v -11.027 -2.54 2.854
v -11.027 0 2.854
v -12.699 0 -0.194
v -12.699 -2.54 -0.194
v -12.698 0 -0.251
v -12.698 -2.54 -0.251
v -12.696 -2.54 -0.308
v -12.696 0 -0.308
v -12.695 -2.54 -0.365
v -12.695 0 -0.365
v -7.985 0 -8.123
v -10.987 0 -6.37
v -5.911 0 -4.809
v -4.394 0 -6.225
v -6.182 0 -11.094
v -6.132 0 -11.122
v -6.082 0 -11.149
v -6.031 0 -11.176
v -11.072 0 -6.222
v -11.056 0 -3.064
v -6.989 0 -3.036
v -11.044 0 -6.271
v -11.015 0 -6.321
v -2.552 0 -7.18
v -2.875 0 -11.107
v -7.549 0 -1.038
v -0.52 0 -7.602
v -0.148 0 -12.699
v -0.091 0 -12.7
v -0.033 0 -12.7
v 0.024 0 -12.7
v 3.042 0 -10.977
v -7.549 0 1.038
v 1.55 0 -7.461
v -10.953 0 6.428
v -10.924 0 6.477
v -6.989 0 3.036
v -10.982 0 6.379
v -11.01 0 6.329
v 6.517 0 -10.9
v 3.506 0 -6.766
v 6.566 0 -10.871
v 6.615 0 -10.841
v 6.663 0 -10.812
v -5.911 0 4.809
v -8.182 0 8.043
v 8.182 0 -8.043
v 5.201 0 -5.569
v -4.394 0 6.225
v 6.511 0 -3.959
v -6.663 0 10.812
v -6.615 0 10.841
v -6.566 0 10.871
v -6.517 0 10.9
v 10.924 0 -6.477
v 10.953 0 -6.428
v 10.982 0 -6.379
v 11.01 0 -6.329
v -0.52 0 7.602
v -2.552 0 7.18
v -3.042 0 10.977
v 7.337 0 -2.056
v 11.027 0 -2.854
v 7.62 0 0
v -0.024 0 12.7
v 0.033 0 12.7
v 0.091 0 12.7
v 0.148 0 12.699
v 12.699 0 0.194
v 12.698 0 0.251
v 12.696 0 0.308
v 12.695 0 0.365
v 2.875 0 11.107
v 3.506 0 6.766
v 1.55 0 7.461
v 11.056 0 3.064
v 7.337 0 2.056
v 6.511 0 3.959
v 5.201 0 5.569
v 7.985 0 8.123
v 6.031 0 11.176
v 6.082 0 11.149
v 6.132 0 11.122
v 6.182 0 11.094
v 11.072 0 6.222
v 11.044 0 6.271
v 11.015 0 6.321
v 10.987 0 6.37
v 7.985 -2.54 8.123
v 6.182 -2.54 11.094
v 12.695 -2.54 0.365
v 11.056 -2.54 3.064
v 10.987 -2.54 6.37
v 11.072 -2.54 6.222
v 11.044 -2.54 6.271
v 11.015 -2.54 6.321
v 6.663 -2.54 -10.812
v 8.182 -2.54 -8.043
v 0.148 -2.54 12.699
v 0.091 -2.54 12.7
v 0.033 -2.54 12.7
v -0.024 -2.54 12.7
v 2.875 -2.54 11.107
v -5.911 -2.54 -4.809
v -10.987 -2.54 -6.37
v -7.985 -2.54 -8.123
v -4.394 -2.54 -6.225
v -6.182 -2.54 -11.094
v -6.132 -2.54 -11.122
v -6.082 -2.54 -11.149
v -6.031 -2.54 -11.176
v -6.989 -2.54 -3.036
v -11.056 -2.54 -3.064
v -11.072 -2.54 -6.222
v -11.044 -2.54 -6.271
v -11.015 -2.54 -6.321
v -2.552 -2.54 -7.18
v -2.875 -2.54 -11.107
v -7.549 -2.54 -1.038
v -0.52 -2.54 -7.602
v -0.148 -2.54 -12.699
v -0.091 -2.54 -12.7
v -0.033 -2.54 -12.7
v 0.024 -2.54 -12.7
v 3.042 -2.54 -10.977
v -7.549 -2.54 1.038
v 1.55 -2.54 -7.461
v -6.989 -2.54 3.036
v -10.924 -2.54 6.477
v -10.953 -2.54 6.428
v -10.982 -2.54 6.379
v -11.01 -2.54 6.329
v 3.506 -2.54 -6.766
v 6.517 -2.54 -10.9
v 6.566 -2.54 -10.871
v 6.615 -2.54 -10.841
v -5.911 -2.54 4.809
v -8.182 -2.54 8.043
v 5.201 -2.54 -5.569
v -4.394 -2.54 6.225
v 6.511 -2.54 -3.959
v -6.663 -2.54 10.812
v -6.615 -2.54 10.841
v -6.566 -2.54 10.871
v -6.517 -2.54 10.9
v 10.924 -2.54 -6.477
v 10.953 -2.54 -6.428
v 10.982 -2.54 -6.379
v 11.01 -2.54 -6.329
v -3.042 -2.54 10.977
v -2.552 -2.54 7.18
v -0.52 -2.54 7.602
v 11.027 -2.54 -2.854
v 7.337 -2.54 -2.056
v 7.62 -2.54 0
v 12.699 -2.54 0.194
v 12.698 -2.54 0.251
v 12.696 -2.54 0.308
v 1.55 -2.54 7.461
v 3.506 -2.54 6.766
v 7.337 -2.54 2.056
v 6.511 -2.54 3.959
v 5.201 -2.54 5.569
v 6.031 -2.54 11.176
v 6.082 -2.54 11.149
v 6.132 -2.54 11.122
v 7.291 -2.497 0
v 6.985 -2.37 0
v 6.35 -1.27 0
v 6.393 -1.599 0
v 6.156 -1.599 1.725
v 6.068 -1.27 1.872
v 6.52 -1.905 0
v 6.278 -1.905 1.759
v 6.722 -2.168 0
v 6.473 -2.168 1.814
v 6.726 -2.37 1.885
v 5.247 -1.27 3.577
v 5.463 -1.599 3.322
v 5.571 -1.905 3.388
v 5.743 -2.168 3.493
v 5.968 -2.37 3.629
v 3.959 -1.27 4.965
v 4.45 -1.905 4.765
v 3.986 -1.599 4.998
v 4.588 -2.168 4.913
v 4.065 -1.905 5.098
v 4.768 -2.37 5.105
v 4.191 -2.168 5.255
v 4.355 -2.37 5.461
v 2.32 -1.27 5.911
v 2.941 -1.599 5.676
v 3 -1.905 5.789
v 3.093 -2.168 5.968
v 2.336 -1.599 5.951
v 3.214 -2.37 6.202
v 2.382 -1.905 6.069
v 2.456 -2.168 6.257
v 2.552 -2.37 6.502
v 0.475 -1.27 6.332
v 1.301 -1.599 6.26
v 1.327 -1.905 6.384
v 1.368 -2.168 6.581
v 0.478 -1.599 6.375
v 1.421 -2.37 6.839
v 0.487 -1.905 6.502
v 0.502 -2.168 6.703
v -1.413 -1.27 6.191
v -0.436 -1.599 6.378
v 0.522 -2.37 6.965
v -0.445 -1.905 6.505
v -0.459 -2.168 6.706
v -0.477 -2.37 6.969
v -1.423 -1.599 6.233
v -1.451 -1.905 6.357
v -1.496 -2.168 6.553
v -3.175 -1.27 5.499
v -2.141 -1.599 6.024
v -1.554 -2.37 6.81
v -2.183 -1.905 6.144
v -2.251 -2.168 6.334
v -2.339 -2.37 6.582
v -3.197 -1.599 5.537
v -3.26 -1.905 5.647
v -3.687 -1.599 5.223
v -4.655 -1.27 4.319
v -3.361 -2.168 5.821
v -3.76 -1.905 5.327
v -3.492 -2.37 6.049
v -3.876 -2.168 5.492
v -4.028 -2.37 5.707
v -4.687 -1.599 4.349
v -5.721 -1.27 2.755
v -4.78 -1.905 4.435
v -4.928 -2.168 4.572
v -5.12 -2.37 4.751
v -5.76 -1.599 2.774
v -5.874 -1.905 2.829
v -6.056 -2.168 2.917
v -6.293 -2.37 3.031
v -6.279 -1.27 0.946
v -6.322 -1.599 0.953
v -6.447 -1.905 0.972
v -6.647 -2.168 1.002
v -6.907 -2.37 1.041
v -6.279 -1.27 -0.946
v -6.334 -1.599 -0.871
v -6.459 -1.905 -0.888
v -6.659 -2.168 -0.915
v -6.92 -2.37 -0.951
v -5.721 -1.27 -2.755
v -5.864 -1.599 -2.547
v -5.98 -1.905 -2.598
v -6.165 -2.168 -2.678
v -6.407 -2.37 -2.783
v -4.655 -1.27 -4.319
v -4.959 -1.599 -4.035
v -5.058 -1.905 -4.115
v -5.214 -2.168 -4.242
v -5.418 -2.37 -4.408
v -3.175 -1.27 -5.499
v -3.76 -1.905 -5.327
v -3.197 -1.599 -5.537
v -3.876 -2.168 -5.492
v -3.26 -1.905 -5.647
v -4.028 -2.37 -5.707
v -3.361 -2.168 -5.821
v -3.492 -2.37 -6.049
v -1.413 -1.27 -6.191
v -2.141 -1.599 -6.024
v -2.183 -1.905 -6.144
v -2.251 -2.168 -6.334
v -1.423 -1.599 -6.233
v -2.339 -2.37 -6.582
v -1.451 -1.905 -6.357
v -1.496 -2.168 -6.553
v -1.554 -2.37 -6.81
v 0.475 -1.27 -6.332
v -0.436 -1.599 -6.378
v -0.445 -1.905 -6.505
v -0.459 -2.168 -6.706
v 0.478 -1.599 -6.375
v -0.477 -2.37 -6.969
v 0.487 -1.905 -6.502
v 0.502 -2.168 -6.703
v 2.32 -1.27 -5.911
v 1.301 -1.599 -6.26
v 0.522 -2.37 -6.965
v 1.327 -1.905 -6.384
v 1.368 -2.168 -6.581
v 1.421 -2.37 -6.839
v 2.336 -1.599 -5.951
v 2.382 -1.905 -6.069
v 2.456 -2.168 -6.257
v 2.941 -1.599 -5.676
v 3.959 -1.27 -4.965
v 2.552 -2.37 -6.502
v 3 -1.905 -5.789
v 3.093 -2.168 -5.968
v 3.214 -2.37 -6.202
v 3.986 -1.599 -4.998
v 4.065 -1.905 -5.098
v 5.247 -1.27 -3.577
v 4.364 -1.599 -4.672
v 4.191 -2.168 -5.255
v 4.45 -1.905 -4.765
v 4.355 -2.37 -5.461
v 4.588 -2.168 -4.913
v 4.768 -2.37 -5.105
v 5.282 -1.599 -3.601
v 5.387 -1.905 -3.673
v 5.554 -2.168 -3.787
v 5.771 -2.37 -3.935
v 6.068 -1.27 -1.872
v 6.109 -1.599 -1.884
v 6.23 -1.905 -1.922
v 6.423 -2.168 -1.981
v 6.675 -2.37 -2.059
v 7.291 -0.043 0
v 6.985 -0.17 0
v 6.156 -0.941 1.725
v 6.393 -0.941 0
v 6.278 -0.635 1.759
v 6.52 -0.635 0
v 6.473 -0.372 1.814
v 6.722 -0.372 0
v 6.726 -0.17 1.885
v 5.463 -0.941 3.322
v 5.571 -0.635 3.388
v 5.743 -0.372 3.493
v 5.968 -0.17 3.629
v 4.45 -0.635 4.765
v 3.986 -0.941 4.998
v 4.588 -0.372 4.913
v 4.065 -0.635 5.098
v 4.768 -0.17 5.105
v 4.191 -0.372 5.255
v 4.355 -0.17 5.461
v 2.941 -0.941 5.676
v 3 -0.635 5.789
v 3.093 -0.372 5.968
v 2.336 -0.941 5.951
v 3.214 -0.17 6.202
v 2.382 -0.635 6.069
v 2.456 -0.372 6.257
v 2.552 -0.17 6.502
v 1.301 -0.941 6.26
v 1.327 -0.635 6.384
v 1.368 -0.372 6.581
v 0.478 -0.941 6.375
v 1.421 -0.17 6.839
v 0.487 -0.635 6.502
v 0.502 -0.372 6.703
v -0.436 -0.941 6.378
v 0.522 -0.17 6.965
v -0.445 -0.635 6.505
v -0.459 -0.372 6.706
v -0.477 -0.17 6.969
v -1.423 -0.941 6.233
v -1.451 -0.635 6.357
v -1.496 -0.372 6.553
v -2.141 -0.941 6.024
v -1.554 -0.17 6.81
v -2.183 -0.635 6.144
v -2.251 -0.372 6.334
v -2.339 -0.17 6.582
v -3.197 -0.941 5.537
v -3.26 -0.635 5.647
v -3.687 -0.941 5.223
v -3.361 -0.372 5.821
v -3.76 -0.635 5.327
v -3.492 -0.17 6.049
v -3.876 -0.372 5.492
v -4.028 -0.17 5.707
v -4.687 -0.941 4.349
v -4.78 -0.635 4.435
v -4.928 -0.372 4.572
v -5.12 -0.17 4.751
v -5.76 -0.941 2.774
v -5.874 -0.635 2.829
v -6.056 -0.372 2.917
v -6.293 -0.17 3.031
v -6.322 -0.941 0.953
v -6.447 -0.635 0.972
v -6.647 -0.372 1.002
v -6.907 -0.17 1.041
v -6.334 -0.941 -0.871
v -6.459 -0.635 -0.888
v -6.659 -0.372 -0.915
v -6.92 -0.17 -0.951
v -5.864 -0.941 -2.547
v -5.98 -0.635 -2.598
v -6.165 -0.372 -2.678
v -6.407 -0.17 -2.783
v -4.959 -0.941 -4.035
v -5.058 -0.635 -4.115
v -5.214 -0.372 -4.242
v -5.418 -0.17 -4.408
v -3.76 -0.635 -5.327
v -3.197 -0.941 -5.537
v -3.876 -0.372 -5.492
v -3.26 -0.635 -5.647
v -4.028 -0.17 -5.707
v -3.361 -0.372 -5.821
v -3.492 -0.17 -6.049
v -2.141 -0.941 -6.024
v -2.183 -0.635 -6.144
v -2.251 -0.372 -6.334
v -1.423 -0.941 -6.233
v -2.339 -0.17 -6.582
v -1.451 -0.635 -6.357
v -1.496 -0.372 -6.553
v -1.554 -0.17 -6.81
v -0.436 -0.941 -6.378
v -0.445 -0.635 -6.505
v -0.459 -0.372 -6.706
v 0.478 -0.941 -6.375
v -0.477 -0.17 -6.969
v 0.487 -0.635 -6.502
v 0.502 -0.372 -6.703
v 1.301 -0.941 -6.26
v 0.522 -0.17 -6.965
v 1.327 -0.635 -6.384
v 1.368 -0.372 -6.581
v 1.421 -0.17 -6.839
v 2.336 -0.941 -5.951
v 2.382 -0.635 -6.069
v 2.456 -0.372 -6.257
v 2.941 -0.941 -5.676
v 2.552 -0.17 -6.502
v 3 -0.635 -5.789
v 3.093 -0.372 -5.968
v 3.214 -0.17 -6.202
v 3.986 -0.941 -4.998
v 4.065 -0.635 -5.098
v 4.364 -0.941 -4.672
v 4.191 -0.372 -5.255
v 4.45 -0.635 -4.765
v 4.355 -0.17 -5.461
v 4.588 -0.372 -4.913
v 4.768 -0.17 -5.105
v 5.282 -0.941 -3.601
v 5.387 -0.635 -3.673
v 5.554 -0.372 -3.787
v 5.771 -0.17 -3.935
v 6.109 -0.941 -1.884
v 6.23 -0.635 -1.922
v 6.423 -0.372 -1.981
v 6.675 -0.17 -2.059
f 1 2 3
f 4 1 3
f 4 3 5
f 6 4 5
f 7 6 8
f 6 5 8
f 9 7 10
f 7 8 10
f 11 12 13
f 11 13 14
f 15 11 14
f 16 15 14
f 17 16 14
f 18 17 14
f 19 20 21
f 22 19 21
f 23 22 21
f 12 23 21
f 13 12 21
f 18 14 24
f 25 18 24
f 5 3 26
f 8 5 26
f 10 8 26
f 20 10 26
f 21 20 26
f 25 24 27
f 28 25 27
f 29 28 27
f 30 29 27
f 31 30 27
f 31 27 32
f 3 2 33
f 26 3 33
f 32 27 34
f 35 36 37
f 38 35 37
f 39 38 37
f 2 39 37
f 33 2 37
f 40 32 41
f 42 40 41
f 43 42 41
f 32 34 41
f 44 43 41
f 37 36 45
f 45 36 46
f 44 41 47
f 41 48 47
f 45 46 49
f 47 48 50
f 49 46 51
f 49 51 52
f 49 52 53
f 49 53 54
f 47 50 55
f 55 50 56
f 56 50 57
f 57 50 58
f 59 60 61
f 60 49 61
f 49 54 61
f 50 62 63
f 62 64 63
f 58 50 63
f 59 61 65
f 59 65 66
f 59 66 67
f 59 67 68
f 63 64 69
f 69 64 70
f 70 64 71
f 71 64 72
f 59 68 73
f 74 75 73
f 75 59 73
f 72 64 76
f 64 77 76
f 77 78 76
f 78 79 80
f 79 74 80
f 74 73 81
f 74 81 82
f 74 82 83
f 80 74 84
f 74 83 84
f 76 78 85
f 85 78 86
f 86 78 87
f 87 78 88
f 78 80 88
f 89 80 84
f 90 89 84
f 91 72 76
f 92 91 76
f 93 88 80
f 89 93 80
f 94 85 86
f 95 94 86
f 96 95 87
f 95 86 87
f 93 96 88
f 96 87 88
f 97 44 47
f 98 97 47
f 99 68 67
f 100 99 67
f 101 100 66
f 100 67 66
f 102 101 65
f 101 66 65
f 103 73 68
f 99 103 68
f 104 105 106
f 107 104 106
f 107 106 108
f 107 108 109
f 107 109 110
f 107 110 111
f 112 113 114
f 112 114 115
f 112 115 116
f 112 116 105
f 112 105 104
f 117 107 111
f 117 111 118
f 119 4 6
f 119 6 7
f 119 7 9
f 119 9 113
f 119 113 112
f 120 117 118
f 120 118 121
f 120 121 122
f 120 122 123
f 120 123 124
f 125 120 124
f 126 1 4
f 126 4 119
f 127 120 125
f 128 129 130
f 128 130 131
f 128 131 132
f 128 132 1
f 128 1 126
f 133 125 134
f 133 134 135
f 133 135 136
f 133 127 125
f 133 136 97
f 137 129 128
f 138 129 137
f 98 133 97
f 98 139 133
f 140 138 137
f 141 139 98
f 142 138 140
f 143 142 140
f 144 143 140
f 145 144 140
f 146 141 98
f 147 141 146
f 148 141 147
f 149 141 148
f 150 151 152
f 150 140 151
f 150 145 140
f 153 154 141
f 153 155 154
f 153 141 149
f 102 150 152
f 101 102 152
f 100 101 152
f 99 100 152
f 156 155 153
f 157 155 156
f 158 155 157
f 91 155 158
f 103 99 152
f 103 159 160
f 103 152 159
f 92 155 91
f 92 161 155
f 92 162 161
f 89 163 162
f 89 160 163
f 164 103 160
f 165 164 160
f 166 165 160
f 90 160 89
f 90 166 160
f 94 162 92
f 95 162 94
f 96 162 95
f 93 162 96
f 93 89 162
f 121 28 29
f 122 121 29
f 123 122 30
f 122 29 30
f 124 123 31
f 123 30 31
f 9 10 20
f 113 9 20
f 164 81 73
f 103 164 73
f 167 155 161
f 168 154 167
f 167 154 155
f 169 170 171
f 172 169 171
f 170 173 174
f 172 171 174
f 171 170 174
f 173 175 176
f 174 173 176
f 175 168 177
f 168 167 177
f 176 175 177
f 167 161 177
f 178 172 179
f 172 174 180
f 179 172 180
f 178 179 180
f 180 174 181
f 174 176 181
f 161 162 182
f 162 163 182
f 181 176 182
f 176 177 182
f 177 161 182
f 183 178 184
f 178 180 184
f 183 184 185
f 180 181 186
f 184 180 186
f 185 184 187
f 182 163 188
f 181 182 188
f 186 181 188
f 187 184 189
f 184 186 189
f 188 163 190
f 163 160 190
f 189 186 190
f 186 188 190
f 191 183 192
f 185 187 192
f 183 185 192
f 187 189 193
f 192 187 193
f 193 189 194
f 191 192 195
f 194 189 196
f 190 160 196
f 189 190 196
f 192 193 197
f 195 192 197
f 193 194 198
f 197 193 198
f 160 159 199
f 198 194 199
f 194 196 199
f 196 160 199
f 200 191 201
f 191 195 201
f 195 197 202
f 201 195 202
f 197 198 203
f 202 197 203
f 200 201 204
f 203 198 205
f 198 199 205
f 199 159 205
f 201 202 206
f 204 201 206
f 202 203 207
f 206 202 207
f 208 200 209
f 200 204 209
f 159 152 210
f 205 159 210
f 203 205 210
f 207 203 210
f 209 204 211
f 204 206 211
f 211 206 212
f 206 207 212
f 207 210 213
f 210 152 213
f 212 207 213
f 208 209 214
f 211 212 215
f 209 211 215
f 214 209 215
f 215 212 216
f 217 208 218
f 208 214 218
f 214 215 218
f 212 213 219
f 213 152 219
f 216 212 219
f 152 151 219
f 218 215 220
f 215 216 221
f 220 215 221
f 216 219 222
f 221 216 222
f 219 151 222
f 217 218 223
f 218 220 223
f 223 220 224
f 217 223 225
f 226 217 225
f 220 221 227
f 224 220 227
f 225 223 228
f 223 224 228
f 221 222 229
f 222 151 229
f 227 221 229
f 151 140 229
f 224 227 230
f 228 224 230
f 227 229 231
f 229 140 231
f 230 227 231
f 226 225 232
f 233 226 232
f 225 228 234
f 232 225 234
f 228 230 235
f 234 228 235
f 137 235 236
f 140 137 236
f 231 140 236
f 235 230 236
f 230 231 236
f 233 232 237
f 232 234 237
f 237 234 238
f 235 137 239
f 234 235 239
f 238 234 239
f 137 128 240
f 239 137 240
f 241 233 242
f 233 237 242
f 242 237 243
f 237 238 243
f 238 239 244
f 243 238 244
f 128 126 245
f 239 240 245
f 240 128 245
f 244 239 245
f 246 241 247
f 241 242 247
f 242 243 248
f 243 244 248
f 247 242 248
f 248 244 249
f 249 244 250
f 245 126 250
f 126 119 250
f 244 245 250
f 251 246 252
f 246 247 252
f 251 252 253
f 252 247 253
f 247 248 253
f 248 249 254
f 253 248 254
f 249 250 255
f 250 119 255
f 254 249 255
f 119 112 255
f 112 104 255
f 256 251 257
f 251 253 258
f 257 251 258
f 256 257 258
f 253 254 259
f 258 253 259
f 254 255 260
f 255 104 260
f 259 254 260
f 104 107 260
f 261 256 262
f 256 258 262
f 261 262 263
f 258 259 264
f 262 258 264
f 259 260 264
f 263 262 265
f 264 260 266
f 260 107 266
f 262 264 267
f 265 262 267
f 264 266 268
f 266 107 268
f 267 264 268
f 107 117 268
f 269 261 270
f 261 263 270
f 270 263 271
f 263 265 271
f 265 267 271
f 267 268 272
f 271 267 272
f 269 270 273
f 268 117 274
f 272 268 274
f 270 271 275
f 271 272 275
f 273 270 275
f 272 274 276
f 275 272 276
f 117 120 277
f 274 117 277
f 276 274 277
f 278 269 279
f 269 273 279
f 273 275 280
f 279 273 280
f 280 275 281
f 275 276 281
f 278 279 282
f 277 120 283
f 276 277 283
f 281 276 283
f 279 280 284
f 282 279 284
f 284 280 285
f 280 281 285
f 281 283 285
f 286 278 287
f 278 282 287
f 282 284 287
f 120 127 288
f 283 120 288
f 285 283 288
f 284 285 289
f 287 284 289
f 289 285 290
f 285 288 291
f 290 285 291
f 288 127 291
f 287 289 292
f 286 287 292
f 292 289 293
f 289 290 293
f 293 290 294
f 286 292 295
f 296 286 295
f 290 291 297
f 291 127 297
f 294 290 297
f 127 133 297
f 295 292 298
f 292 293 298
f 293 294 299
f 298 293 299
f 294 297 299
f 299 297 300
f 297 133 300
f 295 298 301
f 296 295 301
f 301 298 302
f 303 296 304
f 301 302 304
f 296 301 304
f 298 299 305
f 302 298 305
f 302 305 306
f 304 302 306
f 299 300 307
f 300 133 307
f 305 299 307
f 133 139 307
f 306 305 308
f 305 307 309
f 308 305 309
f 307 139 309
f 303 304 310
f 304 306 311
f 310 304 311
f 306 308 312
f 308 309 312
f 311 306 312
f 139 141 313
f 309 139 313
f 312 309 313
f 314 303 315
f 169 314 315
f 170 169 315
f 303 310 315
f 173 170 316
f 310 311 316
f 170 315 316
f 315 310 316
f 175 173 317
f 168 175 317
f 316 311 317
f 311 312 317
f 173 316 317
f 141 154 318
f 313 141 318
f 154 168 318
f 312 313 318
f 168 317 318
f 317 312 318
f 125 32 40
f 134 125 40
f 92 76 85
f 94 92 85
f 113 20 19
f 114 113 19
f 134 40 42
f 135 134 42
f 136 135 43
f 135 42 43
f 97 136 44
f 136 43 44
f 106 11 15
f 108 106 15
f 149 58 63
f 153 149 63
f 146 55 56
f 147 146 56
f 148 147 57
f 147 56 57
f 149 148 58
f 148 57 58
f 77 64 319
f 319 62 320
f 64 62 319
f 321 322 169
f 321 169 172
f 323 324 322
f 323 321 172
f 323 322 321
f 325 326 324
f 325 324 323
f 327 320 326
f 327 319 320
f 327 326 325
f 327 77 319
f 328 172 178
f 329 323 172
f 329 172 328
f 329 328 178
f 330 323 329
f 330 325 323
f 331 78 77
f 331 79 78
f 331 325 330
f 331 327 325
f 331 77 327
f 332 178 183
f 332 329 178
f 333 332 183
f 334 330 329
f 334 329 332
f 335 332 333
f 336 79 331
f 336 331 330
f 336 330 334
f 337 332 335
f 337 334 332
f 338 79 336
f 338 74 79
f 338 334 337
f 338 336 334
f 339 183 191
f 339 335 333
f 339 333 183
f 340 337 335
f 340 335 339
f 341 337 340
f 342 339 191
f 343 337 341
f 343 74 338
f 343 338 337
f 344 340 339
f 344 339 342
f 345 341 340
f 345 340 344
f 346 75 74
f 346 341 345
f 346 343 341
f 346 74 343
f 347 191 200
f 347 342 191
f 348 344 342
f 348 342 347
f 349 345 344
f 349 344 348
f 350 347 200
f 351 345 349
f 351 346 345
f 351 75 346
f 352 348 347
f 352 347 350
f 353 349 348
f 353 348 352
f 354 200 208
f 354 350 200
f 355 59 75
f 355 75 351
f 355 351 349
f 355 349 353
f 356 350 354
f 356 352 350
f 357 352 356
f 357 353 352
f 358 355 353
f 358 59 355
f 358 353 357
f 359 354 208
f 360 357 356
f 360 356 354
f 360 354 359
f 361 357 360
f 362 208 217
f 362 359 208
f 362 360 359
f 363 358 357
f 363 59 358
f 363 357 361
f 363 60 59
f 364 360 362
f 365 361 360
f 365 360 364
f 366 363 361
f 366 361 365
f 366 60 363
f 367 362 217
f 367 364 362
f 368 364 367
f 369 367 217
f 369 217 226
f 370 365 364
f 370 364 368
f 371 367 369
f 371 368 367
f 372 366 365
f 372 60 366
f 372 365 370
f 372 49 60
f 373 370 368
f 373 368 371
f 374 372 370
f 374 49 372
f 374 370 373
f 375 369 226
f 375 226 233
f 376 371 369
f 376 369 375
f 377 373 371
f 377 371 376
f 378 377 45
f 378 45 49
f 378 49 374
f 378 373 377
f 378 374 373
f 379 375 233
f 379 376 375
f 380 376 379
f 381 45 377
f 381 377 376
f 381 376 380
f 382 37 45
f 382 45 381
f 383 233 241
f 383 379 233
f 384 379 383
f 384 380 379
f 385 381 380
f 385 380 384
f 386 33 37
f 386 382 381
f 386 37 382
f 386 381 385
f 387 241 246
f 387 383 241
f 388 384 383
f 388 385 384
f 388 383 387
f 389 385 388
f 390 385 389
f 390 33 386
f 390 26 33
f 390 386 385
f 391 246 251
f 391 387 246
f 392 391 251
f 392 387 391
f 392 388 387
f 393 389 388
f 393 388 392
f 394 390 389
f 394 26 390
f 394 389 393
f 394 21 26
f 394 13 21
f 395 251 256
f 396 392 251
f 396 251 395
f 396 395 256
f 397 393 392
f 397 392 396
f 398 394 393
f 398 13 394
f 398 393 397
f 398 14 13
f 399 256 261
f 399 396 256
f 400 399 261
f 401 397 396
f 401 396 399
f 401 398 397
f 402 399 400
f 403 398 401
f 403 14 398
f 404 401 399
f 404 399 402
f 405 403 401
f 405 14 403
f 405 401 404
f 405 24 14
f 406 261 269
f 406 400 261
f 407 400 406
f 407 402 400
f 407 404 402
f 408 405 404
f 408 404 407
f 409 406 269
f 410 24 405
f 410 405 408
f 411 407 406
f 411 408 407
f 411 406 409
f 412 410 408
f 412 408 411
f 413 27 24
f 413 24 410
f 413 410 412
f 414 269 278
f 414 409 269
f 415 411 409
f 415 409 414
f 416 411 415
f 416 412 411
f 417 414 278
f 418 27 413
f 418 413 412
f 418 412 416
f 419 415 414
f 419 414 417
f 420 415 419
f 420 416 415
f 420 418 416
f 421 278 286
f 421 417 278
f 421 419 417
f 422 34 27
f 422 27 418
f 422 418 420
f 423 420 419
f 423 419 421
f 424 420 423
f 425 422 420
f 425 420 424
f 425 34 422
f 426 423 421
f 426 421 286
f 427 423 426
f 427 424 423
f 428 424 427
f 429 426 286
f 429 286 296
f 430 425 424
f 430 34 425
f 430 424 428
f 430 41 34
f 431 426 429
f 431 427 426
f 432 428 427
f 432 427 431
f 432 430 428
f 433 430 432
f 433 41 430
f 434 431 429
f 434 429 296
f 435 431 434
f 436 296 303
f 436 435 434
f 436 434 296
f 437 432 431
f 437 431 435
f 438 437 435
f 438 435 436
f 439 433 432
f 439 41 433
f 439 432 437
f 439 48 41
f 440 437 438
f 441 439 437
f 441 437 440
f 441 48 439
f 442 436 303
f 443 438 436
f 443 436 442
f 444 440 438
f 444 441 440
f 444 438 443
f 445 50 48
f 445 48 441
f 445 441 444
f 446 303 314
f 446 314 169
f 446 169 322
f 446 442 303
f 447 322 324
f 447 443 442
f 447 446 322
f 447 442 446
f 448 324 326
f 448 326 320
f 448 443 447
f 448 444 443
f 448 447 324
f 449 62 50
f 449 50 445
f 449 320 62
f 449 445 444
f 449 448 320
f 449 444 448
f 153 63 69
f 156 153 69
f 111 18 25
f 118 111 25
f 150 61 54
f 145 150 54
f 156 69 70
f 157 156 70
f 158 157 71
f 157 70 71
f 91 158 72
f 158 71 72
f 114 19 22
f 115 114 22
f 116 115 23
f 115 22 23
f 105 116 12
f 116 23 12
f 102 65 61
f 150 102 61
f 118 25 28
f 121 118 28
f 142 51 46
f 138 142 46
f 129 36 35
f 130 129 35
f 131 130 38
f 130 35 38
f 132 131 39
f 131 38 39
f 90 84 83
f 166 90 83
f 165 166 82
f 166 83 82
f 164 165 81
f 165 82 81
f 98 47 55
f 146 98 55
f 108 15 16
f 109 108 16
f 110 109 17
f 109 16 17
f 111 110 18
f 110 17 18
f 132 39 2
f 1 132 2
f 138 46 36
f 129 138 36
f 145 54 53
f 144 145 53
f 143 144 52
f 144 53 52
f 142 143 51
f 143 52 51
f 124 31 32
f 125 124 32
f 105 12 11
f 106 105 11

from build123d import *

# Parameters (mm, degrees)
F0_R     = 6.35
F1_DEPTH = 2.54
F2_R     = 1.26999


# Not quite as in the source:
# - a fillet or chamfer is up to 0.001 mm smaller than in the source, because OpenCascade refuses the exact size


with BuildPart() as f1:
    # F0 (on Front) → F1 (new body)
    with BuildSketch(Plane.XZ):
        Polygon((8.1817057439, -8.042901042), (11.0273133855, -2.8538767742), (11.0562094944, 3.0641144995), (7.9851864785, 8.1229951402), (2.8745037505, 11.1070155415), (-3.042126907, 10.9768719144), (-8.1817057439, 8.042901042), (-11.0273133855, 2.8538767742), (-11.0562094944, -3.0641144995), (-7.9851864785, -8.1229951402), (-2.8745037505, -11.1070155415), (3.042126907, -10.9768719144), align=None)
        Circle(F0_R, mode=Mode.SUBTRACT)
        with BuildLine():
            Line((-3.042126907, 10.9768719144), (2.8745037505, 11.1070155415))
            Line((2.8745037505, 11.1070155415), (0.1476963834, 12.6991411433))
            ThreePointArc((0.1476963834, 12.6991411433), (0.0620102654, 12.6998486104), (-0.0236786756, 12.699977926))
            Line((-0.0236786756, 12.699977926), (-3.042126907, 10.9768719144))
        make_face()
        with BuildLine():
            Line((-8.1817057439, 8.042901042), (-3.042126907, 10.9768719144))
            Line((-3.042126907, 10.9768719144), (-6.5169336782, 10.9004392312))
            ThreePointArc((-6.5169336782, 10.9004392312), (-6.5903320193, 10.8562205152), (-6.6634303404, 10.8115075775))
            Line((-6.6634303404, 10.8115075775), (-8.1817057439, 8.042901042))
        make_face()
        with BuildLine():
            Line((-11.0273133855, 2.8538767742), (-8.1817057439, 8.042901042))
            Line((-8.1817057439, 8.042901042), (-10.9239306447, 6.4774793917))
            ThreePointArc((-10.9239306447, 6.4774793917), (-10.9673863881, 6.4036267703), (-11.0103428492, 6.3294826284))
            Line((-11.0103428492, 6.3294826284), (-11.0273133855, 2.8538767742))
        make_face()
        with BuildLine():
            Line((-12.6947553855, -0.3649461623), (-11.0562094944, -3.0641144995))
            Line((-11.0562094944, -3.0641144995), (-11.0273133855, 2.8538767742))
            Line((-11.0273133855, 2.8538767742), (-12.6985241258, -0.1936105045))
            ThreePointArc((-12.6985241258, -0.1936105045), (-12.6969287649, -0.2792846905), (-12.6947553855, -0.3649461623))
        make_face()
        with BuildLine():
            Line((-10.9866641736, -6.3704952976), (-7.9851864785, -8.1229951402))
            Line((-7.9851864785, -8.1229951402), (-11.0562094944, -3.0641144995))
            Line((-11.0562094944, -3.0641144995), (-11.0716270281, -6.2216617516))
            ThreePointArc((-11.0716270281, -6.2216617516), (-11.0293966535, -6.2962218401), (-10.9866641736, -6.3704952976))
        make_face()
        with BuildLine():
            Line((-6.0313250452, -11.1764537399), (-2.8745037505, -11.1070155415))
            Line((-2.8745037505, -11.1070155415), (-7.9851864785, -8.1229951402))
            Line((-7.9851864785, -8.1229951402), (-6.1815904476, -11.0940497357))
            ThreePointArc((-6.1815904476, -11.0940497357), (-6.1065967456, -11.1355052057), (-6.0313250452, -11.1764537399))
        make_face()
        with BuildLine():
            Line((0.0236786756, -12.699977926), (3.042126907, -10.9768719144))
            Line((3.042126907, -10.9768719144), (-2.8745037505, -11.1070155415))
            Line((-2.8745037505, -11.1070155415), (-0.1476963834, -12.6991411433))
            ThreePointArc((-0.1476963834, -12.6991411433), (-0.0620102654, -12.6998486104), (0.0236786756, -12.699977926))
        make_face()
        with BuildLine():
            Line((6.6634303404, -10.8115075775), (8.1817057439, -8.042901042))
            Line((8.1817057439, -8.042901042), (3.042126907, -10.9768719144))
            Line((3.042126907, -10.9768719144), (6.5169336782, -10.9004392312))
            ThreePointArc((6.5169336782, -10.9004392312), (6.5903320193, -10.8562205152), (6.6634303404, -10.8115075775))
        make_face()
        with BuildLine():
            ThreePointArc((10.9239306447, -6.4774793917), (10.9673863881, -6.4036267703), (11.0103428492, -6.3294826284))
            Line((11.0103428492, -6.3294826284), (11.0273133855, -2.8538767742))
            Line((11.0273133855, -2.8538767742), (8.1817057439, -8.042901042))
            Line((8.1817057439, -8.042901042), (10.9239306447, -6.4774793917))
        make_face()
        with BuildLine():
            Line((11.0273133855, -2.8538767742), (12.6985241258, 0.1936105045))
            ThreePointArc((12.6985241258, 0.1936105045), (12.6969287649, 0.2792846905), (12.6947553855, 0.3649461623))
            Line((12.6947553855, 0.3649461623), (11.0562094944, 3.0641144995))
            Line((11.0562094944, 3.0641144995), (11.0273133855, -2.8538767742))
        make_face()
        with BuildLine():
            Line((11.0562094944, 3.0641144995), (11.0716270281, 6.2216617516))
            ThreePointArc((11.0716270281, 6.2216617516), (11.0293966535, 6.2962218401), (10.9866641736, 6.3704952976))
            Line((10.9866641736, 6.3704952976), (7.9851864785, 8.1229951402))
            Line((7.9851864785, 8.1229951402), (11.0562094944, 3.0641144995))
        make_face()
        with BuildLine():
            Line((2.8745037505, 11.1070155415), (7.9851864785, 8.1229951402))
            Line((7.9851864785, 8.1229951402), (6.1815904476, 11.0940497357))
            ThreePointArc((6.1815904476, 11.0940497357), (6.1065967456, 11.1355052057), (6.0313250452, 11.1764537399))
            Line((6.0313250452, 11.1764537399), (2.8745037505, 11.1070155415))
        make_face()
    extrude(amount=F1_DEPTH)

    # F2 (radius 1.27 in the source; OpenCascade refuses exactly that, so slightly less here)
    f2_edges = [f1.edges().sort_by_distance(p)[0] for p in [
        (-6.35, -2.54, 0),
        (-6.35, 0, 0),
    ]]
    fillet(f2_edges, radius=F2_R)


solid = f1.part
